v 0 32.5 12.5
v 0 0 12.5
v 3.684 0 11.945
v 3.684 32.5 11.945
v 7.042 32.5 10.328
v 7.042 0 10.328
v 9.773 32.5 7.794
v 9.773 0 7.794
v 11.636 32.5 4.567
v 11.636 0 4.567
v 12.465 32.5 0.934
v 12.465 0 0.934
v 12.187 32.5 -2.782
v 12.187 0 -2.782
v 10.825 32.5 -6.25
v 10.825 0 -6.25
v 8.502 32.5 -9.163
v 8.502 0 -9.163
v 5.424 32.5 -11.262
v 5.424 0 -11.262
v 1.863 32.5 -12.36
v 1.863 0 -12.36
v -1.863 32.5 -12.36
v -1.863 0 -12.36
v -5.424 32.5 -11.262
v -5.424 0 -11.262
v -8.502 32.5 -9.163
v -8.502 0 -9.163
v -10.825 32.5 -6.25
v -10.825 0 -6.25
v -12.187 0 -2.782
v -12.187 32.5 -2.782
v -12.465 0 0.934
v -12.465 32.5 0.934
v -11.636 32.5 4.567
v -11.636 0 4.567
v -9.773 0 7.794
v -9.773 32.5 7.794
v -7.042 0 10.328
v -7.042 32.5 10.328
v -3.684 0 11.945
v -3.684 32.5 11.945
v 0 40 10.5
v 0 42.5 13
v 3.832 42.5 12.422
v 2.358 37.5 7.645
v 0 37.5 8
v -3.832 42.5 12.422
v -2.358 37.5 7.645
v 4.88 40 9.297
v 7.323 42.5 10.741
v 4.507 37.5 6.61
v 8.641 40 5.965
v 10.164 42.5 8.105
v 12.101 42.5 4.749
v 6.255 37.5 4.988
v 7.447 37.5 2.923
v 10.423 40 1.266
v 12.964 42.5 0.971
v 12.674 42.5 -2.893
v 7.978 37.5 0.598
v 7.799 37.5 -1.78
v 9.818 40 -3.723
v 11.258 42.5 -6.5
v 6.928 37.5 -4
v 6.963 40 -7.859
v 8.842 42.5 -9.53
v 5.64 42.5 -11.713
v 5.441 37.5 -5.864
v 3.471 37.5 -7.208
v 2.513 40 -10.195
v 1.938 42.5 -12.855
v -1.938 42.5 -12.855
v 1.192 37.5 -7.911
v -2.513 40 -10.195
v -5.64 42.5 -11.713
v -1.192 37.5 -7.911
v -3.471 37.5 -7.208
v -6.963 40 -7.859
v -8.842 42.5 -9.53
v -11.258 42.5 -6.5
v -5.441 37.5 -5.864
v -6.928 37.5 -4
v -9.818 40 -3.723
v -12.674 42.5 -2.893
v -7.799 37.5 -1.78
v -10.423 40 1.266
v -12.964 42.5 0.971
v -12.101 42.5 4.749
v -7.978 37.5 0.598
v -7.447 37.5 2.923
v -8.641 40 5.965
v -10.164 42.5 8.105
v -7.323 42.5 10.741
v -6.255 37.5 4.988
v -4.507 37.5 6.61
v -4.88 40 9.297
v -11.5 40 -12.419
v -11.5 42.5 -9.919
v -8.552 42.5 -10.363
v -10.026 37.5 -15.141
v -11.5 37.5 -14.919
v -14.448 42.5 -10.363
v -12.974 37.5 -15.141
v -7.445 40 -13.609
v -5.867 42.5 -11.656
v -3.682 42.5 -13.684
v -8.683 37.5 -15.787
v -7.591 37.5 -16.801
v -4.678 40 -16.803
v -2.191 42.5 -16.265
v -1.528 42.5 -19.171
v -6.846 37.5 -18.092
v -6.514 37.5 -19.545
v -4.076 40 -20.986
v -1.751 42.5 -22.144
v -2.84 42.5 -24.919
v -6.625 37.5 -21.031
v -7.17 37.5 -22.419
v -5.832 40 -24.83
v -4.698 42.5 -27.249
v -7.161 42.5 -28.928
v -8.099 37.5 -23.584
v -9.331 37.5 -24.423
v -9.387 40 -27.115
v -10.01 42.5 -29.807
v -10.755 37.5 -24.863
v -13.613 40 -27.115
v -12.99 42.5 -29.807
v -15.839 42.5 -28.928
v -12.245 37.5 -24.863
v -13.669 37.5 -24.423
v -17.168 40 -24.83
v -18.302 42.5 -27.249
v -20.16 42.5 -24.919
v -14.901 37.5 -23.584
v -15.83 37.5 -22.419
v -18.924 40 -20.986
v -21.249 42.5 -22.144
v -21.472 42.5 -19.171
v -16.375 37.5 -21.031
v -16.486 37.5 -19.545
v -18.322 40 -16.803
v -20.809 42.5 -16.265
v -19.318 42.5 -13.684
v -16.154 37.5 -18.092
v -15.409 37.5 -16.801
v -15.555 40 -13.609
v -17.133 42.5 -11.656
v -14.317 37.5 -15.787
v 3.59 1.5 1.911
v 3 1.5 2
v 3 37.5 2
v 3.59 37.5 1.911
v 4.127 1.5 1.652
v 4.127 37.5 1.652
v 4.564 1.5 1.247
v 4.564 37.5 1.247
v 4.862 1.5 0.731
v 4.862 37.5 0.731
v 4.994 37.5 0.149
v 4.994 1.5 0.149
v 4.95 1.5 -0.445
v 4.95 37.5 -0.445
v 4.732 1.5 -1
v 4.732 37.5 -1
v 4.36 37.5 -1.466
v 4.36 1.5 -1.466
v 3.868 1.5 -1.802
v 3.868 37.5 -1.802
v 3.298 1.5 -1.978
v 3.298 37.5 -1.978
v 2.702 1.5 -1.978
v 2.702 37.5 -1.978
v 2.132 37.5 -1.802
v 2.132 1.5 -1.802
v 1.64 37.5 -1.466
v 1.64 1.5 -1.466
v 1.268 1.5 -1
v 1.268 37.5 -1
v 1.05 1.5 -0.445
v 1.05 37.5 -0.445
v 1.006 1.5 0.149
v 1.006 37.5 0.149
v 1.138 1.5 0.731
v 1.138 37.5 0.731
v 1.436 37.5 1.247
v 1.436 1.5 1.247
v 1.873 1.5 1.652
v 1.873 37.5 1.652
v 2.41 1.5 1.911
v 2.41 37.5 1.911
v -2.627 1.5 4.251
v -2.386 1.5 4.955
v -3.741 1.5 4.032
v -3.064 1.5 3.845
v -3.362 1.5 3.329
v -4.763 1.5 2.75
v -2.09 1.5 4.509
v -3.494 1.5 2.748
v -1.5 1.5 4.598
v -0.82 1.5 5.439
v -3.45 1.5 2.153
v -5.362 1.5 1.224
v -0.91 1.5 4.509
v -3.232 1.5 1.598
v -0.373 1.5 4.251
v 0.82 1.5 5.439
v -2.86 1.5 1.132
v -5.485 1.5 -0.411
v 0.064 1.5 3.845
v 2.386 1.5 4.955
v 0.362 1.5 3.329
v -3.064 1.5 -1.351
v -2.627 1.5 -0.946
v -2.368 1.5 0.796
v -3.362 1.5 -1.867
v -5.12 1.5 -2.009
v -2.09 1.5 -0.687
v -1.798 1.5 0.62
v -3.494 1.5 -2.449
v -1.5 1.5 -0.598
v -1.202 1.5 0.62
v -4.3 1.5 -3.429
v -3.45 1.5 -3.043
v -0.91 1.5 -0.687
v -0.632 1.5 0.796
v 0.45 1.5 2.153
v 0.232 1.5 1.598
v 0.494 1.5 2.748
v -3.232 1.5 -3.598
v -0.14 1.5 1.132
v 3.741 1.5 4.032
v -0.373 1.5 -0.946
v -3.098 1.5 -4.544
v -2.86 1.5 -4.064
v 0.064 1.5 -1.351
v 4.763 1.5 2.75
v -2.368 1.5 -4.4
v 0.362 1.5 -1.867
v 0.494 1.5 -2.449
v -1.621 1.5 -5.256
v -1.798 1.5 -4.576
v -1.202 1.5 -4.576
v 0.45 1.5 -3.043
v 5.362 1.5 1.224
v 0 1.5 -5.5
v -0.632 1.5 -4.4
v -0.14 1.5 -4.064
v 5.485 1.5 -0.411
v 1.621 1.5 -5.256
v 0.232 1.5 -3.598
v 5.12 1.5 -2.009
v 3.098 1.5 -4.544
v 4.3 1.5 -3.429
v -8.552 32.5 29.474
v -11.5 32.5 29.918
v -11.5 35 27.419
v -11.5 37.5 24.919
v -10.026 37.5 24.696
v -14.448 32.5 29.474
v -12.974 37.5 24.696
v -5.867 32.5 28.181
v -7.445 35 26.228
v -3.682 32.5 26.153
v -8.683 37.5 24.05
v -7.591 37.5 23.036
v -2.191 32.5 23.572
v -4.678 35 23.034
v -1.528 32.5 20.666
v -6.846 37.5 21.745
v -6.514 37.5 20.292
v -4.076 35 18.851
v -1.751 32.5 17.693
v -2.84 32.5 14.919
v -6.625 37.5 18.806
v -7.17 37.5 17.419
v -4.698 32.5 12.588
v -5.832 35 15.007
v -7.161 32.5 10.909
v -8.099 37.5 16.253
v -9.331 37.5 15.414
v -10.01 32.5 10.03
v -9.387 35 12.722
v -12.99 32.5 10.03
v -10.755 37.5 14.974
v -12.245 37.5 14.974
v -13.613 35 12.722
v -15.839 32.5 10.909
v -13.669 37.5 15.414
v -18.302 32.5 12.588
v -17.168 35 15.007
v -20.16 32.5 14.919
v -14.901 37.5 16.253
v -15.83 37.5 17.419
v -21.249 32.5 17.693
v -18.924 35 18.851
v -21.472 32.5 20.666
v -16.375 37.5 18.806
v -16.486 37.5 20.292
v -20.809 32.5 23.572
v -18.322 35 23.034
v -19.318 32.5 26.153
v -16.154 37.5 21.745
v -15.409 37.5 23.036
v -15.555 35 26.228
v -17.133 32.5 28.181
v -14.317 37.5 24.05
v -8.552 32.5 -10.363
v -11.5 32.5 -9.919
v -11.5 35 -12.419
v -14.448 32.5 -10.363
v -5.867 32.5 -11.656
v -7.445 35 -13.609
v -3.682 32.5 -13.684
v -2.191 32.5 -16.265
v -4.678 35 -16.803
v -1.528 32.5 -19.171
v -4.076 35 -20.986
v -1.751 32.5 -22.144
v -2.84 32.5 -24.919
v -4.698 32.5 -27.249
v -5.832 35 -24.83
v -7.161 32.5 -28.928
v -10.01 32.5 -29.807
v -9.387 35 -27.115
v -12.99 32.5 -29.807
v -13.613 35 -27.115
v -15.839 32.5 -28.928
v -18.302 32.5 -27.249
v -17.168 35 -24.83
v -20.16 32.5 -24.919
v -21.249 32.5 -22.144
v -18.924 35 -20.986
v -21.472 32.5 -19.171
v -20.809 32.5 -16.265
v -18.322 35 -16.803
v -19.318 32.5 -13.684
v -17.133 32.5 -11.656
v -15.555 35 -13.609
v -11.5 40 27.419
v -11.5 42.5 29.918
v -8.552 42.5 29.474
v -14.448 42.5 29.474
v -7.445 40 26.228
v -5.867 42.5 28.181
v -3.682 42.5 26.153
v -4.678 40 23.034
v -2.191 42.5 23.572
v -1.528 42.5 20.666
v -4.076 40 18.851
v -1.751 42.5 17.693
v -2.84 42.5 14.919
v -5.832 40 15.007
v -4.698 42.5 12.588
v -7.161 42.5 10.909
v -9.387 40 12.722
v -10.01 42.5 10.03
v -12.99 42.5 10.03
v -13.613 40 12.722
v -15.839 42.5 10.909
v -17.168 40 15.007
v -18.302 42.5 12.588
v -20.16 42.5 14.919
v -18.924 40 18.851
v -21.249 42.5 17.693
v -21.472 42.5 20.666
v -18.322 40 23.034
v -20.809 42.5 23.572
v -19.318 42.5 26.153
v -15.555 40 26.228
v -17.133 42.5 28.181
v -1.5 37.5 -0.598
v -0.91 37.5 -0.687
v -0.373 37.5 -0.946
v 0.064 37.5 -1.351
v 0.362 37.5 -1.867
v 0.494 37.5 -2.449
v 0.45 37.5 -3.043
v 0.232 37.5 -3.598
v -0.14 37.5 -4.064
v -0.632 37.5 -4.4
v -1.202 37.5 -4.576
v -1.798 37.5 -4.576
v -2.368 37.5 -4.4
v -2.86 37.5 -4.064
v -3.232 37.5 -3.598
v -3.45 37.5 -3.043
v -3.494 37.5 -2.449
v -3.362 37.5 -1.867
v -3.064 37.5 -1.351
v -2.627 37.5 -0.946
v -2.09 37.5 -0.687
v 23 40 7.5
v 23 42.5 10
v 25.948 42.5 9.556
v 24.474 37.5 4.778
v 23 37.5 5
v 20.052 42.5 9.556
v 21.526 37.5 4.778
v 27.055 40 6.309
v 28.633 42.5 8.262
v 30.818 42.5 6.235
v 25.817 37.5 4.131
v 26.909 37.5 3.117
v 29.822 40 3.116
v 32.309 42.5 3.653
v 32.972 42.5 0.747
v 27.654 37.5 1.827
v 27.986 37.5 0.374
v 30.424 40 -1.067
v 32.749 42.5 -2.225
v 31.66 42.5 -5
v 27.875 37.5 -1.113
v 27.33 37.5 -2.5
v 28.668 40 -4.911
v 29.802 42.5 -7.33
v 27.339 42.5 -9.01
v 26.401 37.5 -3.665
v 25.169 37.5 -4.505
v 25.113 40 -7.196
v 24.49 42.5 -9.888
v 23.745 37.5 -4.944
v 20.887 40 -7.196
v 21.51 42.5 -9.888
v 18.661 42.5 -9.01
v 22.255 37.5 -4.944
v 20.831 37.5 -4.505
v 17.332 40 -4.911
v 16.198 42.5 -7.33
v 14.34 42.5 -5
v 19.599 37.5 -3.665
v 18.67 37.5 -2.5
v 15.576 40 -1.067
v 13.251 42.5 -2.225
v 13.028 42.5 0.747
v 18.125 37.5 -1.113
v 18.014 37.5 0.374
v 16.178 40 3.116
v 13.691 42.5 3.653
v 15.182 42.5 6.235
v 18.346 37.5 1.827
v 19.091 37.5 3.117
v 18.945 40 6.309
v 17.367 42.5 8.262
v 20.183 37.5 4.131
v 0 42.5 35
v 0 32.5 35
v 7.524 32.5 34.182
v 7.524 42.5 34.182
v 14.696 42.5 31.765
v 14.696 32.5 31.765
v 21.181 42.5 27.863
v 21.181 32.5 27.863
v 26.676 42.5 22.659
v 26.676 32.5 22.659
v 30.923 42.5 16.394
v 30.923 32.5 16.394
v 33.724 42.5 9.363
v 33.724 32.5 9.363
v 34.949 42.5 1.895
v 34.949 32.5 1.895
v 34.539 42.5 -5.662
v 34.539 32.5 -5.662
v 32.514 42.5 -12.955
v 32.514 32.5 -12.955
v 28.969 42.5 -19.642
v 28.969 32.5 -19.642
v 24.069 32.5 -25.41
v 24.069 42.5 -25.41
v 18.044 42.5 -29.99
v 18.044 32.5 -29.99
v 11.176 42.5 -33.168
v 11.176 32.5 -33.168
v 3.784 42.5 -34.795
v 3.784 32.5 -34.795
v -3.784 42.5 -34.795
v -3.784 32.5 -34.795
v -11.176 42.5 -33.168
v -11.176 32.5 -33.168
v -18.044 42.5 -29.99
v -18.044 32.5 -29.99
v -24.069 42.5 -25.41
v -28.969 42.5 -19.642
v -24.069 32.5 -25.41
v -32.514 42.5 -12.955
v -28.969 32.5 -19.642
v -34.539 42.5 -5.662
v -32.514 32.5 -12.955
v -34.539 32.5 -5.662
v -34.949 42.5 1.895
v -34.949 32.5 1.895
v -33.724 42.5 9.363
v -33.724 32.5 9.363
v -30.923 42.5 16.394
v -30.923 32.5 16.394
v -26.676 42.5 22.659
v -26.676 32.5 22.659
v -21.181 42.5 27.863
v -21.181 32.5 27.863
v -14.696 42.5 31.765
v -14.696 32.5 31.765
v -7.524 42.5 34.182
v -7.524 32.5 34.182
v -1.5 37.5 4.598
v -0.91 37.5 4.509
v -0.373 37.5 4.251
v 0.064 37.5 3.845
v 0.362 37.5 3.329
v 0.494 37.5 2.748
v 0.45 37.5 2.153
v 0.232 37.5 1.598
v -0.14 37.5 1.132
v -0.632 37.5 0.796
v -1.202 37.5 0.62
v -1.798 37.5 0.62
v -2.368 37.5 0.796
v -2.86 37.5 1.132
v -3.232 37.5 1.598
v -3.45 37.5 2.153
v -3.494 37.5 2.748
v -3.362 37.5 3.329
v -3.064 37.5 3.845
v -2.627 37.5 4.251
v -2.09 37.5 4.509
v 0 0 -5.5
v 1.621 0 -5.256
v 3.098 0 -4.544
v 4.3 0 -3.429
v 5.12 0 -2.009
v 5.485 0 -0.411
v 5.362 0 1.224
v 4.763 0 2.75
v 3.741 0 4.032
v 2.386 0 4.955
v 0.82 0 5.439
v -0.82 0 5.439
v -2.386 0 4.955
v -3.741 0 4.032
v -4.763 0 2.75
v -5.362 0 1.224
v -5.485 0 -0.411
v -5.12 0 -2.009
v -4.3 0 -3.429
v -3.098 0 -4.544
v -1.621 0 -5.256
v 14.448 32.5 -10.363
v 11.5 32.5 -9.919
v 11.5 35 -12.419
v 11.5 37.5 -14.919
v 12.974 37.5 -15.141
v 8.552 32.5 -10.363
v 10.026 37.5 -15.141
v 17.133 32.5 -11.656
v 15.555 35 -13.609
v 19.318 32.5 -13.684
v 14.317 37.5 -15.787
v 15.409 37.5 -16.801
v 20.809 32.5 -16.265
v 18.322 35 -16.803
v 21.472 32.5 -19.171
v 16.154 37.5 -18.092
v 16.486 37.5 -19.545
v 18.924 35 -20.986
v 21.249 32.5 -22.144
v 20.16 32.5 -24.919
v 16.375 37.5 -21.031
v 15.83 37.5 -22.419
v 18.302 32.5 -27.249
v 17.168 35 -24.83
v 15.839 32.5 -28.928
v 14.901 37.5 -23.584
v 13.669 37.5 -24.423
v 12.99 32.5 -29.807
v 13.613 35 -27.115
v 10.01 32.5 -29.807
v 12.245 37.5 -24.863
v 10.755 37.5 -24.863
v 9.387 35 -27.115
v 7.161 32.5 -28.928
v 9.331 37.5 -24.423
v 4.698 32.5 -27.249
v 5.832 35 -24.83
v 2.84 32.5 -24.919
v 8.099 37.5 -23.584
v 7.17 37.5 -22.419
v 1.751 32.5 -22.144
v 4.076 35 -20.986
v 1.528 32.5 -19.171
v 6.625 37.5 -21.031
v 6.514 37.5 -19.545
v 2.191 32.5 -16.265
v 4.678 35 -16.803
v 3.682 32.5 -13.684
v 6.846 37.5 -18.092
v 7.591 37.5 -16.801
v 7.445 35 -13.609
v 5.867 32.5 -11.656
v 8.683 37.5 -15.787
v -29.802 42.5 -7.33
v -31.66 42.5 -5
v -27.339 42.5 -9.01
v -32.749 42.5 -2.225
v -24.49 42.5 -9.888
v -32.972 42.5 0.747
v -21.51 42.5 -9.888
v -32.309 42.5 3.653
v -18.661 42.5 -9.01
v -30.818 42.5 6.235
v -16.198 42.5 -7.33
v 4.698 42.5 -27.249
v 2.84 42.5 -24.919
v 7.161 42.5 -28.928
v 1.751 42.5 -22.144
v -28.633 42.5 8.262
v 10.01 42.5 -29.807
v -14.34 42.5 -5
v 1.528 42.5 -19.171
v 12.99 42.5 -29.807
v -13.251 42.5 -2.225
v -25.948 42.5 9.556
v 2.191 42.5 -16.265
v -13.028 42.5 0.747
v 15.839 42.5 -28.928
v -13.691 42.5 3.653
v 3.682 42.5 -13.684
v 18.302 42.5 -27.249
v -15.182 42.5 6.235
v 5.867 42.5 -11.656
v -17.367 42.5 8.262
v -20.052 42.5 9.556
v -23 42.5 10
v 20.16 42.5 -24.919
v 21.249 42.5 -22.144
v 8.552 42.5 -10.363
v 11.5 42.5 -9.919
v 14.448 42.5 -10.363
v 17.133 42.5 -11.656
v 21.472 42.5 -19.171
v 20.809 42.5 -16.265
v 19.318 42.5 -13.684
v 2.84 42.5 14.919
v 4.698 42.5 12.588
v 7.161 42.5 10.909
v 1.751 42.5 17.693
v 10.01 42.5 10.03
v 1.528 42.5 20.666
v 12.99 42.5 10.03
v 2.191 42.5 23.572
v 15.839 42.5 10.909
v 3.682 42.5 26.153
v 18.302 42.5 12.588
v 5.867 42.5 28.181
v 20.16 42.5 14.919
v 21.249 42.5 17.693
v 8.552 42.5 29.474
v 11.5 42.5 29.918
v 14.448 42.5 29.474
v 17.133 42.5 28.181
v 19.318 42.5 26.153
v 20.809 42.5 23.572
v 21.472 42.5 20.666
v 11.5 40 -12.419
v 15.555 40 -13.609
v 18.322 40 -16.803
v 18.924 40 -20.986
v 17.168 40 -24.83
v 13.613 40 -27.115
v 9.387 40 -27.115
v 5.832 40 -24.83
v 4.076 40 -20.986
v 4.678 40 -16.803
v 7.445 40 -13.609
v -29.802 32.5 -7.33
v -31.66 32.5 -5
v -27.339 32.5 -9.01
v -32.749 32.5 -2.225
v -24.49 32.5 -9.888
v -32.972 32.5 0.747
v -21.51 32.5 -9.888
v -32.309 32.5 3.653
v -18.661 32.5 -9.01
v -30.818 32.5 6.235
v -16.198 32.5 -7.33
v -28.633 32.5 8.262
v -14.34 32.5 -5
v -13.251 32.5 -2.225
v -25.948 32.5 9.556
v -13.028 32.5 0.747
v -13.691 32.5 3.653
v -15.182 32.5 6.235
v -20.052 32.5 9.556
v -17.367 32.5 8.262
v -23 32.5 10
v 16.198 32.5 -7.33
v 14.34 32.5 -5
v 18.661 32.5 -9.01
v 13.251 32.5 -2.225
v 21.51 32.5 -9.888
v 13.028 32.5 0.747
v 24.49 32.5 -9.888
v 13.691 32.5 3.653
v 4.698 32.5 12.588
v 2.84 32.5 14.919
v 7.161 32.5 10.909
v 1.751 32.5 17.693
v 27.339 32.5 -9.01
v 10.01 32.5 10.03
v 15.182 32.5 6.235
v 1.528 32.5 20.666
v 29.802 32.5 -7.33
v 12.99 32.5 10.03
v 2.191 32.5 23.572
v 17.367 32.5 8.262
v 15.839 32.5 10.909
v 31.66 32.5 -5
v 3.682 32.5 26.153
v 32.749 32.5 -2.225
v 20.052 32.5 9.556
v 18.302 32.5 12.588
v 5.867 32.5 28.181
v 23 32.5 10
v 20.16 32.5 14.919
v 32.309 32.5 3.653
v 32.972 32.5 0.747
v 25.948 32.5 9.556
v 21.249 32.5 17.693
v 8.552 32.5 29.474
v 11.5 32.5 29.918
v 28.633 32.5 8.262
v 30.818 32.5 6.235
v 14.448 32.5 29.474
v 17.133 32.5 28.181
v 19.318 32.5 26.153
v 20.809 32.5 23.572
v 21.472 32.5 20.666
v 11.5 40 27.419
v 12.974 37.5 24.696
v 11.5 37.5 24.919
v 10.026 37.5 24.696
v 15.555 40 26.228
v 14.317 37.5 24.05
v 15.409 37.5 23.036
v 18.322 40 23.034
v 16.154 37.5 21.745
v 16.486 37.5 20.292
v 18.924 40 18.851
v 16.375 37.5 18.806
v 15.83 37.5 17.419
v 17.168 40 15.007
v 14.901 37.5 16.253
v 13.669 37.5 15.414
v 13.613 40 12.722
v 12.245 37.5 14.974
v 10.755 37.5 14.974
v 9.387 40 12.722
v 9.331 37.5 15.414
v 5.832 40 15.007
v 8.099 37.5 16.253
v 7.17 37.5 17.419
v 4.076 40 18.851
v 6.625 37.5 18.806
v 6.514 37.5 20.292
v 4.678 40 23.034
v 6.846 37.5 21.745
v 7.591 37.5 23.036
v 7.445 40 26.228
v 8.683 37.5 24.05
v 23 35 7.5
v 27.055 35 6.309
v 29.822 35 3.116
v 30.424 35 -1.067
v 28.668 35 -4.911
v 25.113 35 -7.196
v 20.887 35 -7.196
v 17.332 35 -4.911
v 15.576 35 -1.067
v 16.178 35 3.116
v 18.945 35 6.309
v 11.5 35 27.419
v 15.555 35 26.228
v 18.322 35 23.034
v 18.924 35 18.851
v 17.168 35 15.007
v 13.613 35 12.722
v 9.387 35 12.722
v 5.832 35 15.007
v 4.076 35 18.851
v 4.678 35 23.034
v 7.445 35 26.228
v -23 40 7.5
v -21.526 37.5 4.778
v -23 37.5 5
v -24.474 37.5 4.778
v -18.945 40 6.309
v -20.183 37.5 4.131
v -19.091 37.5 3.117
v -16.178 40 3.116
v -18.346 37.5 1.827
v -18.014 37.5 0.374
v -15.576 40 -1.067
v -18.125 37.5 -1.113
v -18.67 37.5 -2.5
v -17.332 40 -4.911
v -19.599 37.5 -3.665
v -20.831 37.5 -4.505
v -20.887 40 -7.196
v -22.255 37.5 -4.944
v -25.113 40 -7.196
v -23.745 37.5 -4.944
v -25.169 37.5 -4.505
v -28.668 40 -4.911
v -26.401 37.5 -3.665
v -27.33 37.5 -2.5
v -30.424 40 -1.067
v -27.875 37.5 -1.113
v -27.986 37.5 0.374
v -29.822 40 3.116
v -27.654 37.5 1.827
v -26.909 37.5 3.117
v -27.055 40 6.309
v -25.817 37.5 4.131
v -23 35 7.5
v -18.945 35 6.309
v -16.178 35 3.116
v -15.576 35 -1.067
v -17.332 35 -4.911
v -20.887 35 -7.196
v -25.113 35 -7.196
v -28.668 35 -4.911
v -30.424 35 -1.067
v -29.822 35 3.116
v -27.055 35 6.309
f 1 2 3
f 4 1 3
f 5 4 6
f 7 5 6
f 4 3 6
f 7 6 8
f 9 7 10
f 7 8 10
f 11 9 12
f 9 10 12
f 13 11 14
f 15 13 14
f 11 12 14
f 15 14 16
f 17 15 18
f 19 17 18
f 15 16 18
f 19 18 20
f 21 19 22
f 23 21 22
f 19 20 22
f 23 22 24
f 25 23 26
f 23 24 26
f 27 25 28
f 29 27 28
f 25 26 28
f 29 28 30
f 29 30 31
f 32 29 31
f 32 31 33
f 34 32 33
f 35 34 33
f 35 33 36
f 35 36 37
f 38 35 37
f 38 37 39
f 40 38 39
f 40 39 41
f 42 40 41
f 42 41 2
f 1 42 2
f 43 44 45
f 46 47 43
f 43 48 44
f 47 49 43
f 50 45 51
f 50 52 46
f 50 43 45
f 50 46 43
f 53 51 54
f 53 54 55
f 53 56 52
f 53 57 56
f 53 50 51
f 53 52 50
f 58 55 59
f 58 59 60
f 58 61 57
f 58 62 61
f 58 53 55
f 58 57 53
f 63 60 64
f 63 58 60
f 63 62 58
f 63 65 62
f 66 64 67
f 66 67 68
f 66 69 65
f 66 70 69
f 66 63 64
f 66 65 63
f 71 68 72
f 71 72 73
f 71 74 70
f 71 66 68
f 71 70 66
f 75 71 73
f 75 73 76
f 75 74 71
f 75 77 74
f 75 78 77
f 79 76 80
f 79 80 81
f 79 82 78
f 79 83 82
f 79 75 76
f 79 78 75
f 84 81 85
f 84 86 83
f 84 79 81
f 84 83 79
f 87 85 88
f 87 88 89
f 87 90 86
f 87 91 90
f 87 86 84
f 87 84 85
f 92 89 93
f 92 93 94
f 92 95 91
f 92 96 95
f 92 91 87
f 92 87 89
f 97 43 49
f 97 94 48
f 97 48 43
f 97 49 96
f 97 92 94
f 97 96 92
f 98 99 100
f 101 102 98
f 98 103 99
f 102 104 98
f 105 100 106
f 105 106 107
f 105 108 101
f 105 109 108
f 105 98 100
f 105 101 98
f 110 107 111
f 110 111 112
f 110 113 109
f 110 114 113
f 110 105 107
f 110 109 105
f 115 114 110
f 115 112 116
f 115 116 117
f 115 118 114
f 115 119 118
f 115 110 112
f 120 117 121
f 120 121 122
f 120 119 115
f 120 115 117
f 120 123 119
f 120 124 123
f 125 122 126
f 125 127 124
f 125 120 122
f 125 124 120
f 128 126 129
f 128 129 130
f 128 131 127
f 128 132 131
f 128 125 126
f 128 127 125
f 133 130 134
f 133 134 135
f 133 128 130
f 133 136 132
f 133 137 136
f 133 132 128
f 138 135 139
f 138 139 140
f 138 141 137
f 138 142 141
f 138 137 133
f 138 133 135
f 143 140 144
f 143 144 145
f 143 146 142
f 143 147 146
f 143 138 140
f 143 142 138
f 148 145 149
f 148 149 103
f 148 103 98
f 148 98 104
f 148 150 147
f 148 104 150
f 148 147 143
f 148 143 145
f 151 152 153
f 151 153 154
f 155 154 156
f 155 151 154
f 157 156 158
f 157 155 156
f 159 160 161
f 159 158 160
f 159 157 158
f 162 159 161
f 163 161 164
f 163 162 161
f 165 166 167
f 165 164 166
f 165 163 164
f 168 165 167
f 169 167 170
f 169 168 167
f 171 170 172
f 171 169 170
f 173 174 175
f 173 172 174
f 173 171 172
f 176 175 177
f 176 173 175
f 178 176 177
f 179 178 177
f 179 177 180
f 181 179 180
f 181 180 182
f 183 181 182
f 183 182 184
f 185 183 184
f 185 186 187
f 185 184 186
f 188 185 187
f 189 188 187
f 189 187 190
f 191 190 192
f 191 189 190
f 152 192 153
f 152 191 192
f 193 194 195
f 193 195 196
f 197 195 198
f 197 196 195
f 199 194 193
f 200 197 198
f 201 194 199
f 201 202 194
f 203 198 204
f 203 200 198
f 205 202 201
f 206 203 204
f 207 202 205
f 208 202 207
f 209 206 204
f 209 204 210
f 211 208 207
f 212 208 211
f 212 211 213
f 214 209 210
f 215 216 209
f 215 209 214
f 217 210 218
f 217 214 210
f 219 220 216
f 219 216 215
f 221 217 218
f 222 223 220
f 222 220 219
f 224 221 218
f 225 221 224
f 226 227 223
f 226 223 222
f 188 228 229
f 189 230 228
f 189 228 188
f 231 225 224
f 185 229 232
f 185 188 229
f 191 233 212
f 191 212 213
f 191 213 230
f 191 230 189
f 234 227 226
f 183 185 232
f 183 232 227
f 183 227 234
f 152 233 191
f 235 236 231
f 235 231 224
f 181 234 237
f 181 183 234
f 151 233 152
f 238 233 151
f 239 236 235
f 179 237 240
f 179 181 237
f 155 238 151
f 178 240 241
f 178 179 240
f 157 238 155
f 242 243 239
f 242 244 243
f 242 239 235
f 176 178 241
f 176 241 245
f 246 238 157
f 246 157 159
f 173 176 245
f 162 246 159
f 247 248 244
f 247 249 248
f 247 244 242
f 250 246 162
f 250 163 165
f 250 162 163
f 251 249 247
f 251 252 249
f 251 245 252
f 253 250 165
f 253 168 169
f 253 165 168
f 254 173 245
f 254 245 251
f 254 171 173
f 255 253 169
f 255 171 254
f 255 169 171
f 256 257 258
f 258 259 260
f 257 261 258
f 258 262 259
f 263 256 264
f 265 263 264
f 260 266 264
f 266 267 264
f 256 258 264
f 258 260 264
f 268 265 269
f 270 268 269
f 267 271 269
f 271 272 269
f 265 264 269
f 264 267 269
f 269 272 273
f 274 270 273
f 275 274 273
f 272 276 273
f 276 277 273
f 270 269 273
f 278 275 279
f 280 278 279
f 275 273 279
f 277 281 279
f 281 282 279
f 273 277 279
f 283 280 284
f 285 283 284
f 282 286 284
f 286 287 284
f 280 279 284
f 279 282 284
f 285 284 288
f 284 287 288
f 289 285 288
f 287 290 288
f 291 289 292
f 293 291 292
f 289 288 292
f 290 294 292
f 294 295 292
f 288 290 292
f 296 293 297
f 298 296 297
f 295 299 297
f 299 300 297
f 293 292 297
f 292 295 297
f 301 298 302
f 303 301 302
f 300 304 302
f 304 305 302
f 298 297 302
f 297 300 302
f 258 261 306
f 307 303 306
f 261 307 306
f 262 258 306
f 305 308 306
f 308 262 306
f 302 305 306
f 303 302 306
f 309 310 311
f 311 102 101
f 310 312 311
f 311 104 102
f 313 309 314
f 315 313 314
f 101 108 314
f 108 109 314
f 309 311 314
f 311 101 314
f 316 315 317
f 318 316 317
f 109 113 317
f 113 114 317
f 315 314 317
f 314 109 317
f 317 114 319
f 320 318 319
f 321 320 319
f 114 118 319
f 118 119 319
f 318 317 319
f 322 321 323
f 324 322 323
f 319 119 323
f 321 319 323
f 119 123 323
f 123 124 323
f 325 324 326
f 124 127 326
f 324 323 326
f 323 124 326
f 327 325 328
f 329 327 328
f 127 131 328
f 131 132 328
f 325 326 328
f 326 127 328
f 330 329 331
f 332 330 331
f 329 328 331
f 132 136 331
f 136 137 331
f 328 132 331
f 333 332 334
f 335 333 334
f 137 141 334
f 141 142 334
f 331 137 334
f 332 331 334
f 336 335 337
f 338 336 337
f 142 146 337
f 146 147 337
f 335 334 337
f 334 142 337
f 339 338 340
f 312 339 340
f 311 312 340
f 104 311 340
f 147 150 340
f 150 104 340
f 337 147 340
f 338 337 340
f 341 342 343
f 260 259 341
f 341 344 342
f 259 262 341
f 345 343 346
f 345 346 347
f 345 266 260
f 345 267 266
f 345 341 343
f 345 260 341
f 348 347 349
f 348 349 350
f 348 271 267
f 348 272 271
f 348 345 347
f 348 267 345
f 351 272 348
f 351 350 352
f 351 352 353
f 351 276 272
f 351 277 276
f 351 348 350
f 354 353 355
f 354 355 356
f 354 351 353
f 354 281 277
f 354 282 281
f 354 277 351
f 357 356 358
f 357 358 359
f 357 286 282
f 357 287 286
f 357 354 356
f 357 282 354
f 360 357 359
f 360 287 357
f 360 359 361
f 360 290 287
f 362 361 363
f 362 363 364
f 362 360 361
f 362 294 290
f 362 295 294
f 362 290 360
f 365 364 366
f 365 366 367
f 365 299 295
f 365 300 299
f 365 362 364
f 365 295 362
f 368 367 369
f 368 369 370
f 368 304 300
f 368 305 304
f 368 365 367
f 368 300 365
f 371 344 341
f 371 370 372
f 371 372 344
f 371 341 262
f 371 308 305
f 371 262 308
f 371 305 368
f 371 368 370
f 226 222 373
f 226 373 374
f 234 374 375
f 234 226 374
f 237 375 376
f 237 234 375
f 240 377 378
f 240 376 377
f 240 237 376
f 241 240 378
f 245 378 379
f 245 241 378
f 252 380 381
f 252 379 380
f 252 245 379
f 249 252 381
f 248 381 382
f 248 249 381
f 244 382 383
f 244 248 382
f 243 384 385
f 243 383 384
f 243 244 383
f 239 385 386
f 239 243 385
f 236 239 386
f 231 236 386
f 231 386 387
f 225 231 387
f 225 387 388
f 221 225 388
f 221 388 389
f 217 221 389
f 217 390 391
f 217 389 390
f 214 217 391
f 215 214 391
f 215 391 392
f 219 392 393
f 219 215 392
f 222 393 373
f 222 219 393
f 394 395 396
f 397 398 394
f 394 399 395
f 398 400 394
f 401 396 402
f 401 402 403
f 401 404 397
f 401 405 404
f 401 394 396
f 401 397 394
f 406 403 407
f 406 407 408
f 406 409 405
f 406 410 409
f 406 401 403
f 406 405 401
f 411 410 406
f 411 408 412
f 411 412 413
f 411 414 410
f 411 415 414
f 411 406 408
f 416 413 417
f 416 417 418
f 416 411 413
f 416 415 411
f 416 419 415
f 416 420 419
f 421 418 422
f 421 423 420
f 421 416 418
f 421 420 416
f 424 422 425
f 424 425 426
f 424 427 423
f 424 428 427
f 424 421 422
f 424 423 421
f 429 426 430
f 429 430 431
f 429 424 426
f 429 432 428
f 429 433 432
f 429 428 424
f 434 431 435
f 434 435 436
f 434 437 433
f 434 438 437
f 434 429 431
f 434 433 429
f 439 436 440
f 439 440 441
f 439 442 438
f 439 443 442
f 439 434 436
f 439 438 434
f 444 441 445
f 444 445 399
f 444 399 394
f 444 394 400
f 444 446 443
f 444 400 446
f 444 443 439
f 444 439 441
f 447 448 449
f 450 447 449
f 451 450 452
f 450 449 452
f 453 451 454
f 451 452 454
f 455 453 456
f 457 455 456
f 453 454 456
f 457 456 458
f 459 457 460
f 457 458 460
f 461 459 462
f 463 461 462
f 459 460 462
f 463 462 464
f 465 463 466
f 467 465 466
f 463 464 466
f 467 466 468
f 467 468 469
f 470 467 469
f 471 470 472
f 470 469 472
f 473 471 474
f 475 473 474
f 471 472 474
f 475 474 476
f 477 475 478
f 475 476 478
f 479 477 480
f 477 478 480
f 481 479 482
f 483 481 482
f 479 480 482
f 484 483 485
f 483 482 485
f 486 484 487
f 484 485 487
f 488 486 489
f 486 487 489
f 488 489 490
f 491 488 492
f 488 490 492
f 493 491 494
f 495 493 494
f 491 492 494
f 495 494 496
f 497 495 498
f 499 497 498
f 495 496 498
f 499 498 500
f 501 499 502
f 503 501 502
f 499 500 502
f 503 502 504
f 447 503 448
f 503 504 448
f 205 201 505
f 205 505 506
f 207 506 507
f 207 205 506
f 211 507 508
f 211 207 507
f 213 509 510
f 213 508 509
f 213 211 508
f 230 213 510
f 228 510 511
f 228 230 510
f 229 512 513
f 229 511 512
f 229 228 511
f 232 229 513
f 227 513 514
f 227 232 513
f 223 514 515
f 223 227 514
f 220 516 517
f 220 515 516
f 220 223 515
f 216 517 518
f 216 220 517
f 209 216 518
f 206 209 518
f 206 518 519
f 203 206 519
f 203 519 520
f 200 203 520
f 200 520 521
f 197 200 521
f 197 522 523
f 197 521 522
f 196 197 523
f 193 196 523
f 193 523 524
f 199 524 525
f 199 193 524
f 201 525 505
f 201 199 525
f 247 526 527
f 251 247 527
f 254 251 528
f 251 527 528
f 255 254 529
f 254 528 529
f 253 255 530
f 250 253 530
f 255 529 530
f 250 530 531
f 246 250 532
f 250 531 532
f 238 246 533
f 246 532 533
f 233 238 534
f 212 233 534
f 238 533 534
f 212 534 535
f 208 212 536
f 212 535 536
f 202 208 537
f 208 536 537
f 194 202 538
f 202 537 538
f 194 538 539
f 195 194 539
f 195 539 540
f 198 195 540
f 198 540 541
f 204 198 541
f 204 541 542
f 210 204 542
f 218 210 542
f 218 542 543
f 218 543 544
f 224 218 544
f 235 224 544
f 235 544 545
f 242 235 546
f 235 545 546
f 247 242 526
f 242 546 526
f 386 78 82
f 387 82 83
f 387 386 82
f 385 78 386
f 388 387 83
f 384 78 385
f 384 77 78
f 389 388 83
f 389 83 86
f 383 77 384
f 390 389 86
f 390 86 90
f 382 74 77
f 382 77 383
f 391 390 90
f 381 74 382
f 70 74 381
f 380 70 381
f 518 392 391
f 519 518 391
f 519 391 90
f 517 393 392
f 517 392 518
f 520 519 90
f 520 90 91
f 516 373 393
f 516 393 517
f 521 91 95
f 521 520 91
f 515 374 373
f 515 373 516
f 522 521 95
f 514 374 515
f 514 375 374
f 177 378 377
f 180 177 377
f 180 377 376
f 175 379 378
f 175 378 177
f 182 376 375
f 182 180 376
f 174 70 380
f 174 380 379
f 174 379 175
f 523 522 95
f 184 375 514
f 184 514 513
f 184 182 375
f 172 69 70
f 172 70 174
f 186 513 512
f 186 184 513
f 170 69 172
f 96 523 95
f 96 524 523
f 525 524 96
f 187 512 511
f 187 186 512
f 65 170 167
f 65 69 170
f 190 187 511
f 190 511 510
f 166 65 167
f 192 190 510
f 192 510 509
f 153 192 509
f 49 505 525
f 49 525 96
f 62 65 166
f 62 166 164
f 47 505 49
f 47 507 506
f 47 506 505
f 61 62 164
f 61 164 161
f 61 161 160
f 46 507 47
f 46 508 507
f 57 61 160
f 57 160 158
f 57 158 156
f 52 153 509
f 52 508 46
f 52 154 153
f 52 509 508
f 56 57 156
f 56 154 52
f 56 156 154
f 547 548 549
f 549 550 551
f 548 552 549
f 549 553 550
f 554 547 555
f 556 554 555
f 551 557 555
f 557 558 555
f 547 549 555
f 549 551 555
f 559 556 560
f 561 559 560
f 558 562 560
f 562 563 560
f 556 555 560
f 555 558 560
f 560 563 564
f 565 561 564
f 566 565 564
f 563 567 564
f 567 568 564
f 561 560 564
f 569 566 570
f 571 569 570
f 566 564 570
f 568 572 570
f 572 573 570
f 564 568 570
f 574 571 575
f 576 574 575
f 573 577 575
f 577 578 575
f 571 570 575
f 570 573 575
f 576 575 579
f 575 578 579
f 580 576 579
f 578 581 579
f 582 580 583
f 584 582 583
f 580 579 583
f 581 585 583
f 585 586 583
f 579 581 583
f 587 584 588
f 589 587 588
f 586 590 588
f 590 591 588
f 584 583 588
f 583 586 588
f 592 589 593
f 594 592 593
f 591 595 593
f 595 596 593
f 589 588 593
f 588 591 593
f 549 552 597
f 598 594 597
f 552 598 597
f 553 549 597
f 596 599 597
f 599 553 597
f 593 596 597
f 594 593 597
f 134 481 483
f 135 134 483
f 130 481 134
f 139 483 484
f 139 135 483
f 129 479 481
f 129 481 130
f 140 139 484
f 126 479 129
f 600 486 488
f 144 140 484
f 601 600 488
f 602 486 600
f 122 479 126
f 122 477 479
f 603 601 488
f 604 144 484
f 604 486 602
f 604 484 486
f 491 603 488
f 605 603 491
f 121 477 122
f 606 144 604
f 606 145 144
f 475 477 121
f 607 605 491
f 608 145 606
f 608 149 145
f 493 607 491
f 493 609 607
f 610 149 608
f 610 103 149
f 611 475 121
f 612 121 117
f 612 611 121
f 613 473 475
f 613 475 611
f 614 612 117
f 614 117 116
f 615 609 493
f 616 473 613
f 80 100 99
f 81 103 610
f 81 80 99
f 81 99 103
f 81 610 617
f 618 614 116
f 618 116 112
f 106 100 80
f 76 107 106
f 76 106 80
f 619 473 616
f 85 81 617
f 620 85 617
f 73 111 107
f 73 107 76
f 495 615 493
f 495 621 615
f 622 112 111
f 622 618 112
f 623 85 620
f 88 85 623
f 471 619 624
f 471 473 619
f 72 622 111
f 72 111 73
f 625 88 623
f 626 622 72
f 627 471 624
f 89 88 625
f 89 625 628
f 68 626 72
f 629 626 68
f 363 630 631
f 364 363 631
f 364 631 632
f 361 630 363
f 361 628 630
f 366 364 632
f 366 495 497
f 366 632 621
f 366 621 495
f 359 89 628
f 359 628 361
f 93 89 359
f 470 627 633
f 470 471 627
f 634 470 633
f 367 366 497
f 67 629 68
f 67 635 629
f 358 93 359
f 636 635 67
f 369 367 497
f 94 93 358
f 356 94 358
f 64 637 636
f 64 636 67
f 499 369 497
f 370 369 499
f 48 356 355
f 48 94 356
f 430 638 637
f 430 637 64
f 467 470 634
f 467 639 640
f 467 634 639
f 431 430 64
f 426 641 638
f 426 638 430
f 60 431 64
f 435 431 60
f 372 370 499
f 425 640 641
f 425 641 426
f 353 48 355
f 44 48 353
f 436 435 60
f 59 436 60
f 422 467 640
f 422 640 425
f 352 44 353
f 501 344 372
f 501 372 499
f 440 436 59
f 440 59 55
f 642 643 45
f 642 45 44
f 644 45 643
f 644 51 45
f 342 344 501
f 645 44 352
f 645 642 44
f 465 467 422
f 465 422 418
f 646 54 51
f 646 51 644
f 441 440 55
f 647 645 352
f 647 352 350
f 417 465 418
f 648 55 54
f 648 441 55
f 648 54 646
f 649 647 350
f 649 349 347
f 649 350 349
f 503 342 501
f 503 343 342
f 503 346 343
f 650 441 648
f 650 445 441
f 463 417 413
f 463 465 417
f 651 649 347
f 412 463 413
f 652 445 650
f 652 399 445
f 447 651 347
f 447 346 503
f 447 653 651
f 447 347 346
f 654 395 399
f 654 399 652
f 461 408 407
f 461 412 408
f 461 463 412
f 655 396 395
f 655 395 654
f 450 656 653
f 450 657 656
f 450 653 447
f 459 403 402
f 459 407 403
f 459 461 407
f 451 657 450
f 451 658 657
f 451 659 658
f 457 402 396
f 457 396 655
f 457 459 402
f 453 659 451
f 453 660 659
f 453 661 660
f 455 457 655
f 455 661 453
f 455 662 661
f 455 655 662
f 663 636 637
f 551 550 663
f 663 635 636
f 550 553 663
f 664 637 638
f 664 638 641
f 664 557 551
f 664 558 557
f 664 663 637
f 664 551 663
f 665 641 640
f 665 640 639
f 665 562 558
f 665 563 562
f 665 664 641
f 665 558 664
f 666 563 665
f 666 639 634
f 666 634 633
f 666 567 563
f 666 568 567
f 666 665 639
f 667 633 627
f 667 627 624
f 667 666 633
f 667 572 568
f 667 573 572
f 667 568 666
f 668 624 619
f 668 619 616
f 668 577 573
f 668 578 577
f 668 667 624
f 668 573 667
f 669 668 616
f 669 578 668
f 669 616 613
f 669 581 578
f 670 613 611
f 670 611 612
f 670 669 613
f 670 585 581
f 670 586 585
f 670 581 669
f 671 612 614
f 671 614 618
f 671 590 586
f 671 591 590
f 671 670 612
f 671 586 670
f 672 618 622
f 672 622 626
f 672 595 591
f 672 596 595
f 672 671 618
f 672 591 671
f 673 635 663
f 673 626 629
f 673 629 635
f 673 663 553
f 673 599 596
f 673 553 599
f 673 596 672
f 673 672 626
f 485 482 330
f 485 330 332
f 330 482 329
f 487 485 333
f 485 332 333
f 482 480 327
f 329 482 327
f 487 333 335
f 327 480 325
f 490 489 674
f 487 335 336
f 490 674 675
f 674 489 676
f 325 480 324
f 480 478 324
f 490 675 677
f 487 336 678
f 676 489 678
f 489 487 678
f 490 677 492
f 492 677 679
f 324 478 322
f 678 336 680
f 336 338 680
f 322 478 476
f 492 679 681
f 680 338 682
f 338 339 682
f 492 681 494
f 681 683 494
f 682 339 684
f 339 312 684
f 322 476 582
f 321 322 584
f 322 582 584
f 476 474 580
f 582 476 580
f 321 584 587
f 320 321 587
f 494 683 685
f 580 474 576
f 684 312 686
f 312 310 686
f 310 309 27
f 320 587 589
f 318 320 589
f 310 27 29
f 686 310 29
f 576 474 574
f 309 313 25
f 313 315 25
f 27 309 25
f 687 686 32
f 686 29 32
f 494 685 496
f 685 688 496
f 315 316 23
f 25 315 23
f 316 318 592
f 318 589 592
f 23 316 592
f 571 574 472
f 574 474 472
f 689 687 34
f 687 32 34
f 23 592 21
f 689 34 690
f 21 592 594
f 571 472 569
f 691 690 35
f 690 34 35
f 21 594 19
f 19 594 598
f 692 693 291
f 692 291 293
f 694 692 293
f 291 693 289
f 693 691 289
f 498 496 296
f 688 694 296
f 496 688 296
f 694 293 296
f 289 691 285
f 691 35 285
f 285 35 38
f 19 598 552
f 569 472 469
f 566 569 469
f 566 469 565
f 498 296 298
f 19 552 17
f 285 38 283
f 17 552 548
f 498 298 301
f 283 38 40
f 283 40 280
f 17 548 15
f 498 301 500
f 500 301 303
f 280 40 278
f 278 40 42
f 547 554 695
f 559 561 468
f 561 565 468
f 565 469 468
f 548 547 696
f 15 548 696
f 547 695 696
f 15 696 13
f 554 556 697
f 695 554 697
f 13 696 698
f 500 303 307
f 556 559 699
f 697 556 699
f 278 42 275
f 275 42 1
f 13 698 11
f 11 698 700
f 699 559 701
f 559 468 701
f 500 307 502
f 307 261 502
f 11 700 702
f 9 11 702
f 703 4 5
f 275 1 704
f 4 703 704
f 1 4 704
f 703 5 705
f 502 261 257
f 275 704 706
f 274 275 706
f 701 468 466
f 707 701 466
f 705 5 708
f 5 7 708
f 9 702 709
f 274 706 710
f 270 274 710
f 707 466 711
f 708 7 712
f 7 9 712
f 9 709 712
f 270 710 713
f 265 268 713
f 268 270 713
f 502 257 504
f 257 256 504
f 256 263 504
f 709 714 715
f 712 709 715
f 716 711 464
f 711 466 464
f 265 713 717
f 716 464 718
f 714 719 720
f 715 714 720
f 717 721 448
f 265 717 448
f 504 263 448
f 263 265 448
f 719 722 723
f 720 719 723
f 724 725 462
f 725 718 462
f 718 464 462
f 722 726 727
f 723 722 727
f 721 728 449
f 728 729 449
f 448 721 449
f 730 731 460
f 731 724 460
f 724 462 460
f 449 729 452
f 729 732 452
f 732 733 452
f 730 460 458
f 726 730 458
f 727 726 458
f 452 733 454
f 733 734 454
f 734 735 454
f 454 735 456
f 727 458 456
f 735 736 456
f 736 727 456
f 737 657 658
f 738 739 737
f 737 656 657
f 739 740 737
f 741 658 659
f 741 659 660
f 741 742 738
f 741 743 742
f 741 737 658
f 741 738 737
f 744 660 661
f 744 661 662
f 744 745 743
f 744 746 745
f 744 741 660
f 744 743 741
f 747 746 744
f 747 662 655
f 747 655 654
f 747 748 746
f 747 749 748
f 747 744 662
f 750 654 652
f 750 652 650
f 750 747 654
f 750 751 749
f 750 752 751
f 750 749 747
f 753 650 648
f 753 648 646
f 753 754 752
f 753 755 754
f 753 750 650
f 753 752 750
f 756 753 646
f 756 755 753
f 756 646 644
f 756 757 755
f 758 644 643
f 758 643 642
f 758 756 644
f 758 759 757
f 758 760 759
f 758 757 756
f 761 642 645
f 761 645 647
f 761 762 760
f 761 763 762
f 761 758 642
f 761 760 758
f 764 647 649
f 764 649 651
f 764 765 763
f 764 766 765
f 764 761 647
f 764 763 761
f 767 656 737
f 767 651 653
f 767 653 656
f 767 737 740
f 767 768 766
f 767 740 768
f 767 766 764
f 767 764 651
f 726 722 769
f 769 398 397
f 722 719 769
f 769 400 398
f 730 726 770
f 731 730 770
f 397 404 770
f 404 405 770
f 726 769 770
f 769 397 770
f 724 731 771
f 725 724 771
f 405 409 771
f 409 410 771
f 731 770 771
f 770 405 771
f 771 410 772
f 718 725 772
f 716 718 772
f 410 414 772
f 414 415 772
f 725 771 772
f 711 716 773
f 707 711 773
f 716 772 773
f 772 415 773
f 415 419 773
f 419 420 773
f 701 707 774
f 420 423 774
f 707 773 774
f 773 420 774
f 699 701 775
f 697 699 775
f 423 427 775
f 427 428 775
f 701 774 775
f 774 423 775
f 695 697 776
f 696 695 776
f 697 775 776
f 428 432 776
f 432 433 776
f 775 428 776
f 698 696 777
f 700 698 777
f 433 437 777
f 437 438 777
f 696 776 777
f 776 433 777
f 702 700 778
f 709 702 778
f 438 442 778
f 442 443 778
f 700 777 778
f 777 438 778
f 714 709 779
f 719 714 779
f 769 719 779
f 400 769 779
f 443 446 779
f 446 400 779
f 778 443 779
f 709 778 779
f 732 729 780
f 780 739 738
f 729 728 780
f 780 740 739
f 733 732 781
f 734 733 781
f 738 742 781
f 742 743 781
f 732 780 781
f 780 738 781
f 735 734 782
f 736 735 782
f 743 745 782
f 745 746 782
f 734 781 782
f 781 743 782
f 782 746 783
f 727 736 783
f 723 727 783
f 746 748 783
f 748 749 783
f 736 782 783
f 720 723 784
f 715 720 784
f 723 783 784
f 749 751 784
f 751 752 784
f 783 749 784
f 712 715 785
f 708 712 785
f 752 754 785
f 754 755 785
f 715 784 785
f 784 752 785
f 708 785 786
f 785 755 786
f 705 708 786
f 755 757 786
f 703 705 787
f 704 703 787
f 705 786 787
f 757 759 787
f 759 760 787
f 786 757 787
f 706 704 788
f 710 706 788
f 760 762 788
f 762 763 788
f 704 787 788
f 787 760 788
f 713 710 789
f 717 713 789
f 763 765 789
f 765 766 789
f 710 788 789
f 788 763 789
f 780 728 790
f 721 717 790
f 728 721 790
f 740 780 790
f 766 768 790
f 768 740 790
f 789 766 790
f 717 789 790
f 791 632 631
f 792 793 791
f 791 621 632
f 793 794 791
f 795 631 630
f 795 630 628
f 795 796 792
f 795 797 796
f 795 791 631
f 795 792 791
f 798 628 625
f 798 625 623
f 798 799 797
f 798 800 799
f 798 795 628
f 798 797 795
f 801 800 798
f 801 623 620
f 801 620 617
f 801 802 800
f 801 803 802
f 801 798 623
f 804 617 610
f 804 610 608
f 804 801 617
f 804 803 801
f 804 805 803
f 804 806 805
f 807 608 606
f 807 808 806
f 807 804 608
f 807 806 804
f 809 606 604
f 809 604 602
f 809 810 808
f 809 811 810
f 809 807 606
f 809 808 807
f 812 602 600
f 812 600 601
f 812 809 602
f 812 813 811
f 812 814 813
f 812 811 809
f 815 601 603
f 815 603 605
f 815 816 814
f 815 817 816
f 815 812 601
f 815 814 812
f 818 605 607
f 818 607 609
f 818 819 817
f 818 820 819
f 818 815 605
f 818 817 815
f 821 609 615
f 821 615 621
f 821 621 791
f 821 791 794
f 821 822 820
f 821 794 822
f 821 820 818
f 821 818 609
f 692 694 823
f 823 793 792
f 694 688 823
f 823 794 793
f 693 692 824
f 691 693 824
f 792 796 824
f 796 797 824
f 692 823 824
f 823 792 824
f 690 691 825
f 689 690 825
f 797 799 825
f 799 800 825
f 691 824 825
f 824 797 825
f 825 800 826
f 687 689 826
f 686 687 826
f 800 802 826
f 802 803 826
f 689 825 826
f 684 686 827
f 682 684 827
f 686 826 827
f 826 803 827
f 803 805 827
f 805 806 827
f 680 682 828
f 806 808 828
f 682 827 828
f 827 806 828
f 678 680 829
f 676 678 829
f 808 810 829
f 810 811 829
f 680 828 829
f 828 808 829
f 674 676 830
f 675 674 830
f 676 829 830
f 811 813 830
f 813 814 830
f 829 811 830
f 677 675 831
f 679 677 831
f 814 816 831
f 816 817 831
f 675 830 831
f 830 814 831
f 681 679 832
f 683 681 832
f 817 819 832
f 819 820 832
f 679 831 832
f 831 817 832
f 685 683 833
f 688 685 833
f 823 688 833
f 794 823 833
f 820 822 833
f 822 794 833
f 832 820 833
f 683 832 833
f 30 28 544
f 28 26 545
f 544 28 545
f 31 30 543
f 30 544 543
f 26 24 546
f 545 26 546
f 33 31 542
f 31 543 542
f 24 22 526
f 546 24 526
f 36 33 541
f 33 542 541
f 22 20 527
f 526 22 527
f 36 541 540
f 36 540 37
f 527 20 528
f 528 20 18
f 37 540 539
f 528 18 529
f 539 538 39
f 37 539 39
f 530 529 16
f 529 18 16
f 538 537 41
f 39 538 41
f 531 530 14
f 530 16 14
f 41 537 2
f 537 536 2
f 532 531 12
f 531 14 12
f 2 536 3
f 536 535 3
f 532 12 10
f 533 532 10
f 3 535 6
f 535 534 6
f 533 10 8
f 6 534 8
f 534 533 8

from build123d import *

# Parameters (mm, degrees)
SKETCH1_R           = 12.5
SKETCH1_R_2         = 2
BOSS_EXTRUDE1_DEPTH = 42.5
SKETCH2_R           = 5.5
CUT_EXTRUDE1_DEPTH  = 1.5
BOSS_EXTRUDE3_START = -10
SKETCH3_R           = 35
SKETCH3_R_2         = 12.5
BOSS_EXTRUDE3_DEPTH = 10
SKETCH4_R           = 5
CUT_EXTRUDE5_DEPTH  = 10
CHAMFER7_SIZE       = 5
CUT_EXTRUDE6_START  = -5
SKETCH7_R           = 8
SKETCH7_R_2         = 5.5
SKETCH7_R_3         = 2
CUT_EXTRUDE6_DEPTH  = 5
CHAMFER8_SIZE       = 5


with BuildPart() as part:
    # Sketch1 → Boss-Extrude1 (new body)
    with BuildSketch(Plane(origin=(0, 0, 0), x_dir=(1, 0, 0), z_dir=(0, 1, 0))):
        with Locations(Location((0, 0, 0), (0, 0, 270))):
            Circle(SKETCH1_R)
        with Locations(Location((3, 0, 0), (0, 0, 270))):
            Circle(SKETCH1_R_2, mode=Mode.SUBTRACT)
        with Locations(Location((-1.5, -2.598076211, 0), (0, 0, 270))):
            Circle(SKETCH1_R_2, mode=Mode.SUBTRACT)
        with Locations(Location((-1.5, 2.598076211, 0), (0, 0, 270))):
            Circle(SKETCH1_R_2, mode=Mode.SUBTRACT)
    extrude(amount=BOSS_EXTRUDE1_DEPTH)

    # Sketch2 → Cut-Extrude1 (cut)
    with BuildSketch(Plane.XZ):
        with Locations(Location((0, 0, 0), (0, 0, 270))):
            Circle(SKETCH2_R)
    extrude(amount=-CUT_EXTRUDE1_DEPTH, mode=Mode.SUBTRACT)

    # Sketch3 → Boss-Extrude3 (add)
    with BuildSketch(Plane(origin=(0, 42.5, 0), x_dir=(1, 0, 0), z_dir=(0, 1, 0)).offset(BOSS_EXTRUDE3_START)):
        with Locations(Location((0, 0, 0), (0, 0, 270))):
            Circle(SKETCH3_R)
        with Locations(Location((0, 0, 0), (0, 0, 270))):
            Circle(SKETCH3_R_2, mode=Mode.SUBTRACT)
    extrude(amount=BOSS_EXTRUDE3_DEPTH)

    # Sketch4 → Cut-Extrude5 (cut)
    with BuildSketch(Plane(origin=(0, 42.5, 0), x_dir=(1, 0, 0), z_dir=(0, 1, 0))):
        with Locations(Location((-23, 0, 0), (0, 0, 270))):
            Circle(SKETCH4_R)
        with Locations(Location((-11.5, 19.918584287, 0), (0, 0, 270))):
            Circle(SKETCH4_R)
        with Locations(Location((11.5, 19.918584287, 0), (0, 0, 270))):
            Circle(SKETCH4_R)
        with Locations(Location((23, 0, 0), (0, 0, 270))):
            Circle(SKETCH4_R)
        with Locations(Location((11.5, -19.918584287, 0), (0, 0, 270))):
            Circle(SKETCH4_R)
        with Locations(Location((-11.5, -19.918584287, 0), (0, 0, 270))):
            Circle(SKETCH4_R)
    extrude(amount=-CUT_EXTRUDE5_DEPTH, mode=Mode.SUBTRACT)

    # Chamfer7
    chamfer7_edges = [part.edges().sort_by_distance(p)[0] for p in [
        (-23, 32.5, -5),
        (-23, 42.5, -5),
        (-11.5, 32.5, 14.918584287),
        (-11.5, 42.5, 14.918584287),
        (11.5, 32.5, 14.918584287),
        (11.5, 42.5, 14.918584287),
        (23, 32.5, -5),
        (23, 42.5, -5),
        (11.5, 32.5, -24.918584287),
        (11.5, 42.5, -24.918584287),
        (-11.5, 32.5, -24.918584287),
        (-11.5, 42.5, -24.918584287),
    ]]
    chamfer(chamfer7_edges, length=CHAMFER7_SIZE - 0.0001)  # a hair under: the kernel refuses the full size

    # Sketch7 → Cut-Extrude6 (cut)
    # profile 1 of 2: a face of its own
    with BuildSketch(Plane(origin=(0, 42.5, 0), x_dir=(1, 0, 0), z_dir=(0, 1, 0)).offset(CUT_EXTRUDE6_START)):
        with Locations(Location((0, 0, 0), (0, 0, 270))):
            Circle(SKETCH7_R)
        with Locations(Location((0, 0, 0), (0, 0, 90))):
            Circle(SKETCH7_R_2, mode=Mode.SUBTRACT)
    # profile 2 of 2: a face of its own
    with BuildSketch(Plane(origin=(0, 42.5, 0), x_dir=(1, 0, 0), z_dir=(0, 1, 0)).offset(CUT_EXTRUDE6_START)):
        with Locations(Location((0, 0, 0), (0, 0, 90))):
            Circle(SKETCH7_R_2)
        with Locations(Location((-1.5, 2.598076211, 0), (0, 0, 90))):
            Circle(SKETCH7_R_3, mode=Mode.SUBTRACT)
        with Locations(Location((-1.5, -2.598076211, 0), (0, 0, 90))):
            Circle(SKETCH7_R_3, mode=Mode.SUBTRACT)
        with Locations(Location((3, 0, 0), (0, 0, 90))):
            Circle(SKETCH7_R_3, mode=Mode.SUBTRACT)
    extrude(amount=CUT_EXTRUDE6_DEPTH, mode=Mode.SUBTRACT)

    # Chamfer8
    chamfer8_edges = [part.edges().sort_by_distance(p)[0] for p in [
        (0, 42.5, -8),
    ]]
    chamfer(chamfer8_edges, length=CHAMFER8_SIZE - 0.0001)  # a hair under: the kernel refuses the full size


solid = part.part
